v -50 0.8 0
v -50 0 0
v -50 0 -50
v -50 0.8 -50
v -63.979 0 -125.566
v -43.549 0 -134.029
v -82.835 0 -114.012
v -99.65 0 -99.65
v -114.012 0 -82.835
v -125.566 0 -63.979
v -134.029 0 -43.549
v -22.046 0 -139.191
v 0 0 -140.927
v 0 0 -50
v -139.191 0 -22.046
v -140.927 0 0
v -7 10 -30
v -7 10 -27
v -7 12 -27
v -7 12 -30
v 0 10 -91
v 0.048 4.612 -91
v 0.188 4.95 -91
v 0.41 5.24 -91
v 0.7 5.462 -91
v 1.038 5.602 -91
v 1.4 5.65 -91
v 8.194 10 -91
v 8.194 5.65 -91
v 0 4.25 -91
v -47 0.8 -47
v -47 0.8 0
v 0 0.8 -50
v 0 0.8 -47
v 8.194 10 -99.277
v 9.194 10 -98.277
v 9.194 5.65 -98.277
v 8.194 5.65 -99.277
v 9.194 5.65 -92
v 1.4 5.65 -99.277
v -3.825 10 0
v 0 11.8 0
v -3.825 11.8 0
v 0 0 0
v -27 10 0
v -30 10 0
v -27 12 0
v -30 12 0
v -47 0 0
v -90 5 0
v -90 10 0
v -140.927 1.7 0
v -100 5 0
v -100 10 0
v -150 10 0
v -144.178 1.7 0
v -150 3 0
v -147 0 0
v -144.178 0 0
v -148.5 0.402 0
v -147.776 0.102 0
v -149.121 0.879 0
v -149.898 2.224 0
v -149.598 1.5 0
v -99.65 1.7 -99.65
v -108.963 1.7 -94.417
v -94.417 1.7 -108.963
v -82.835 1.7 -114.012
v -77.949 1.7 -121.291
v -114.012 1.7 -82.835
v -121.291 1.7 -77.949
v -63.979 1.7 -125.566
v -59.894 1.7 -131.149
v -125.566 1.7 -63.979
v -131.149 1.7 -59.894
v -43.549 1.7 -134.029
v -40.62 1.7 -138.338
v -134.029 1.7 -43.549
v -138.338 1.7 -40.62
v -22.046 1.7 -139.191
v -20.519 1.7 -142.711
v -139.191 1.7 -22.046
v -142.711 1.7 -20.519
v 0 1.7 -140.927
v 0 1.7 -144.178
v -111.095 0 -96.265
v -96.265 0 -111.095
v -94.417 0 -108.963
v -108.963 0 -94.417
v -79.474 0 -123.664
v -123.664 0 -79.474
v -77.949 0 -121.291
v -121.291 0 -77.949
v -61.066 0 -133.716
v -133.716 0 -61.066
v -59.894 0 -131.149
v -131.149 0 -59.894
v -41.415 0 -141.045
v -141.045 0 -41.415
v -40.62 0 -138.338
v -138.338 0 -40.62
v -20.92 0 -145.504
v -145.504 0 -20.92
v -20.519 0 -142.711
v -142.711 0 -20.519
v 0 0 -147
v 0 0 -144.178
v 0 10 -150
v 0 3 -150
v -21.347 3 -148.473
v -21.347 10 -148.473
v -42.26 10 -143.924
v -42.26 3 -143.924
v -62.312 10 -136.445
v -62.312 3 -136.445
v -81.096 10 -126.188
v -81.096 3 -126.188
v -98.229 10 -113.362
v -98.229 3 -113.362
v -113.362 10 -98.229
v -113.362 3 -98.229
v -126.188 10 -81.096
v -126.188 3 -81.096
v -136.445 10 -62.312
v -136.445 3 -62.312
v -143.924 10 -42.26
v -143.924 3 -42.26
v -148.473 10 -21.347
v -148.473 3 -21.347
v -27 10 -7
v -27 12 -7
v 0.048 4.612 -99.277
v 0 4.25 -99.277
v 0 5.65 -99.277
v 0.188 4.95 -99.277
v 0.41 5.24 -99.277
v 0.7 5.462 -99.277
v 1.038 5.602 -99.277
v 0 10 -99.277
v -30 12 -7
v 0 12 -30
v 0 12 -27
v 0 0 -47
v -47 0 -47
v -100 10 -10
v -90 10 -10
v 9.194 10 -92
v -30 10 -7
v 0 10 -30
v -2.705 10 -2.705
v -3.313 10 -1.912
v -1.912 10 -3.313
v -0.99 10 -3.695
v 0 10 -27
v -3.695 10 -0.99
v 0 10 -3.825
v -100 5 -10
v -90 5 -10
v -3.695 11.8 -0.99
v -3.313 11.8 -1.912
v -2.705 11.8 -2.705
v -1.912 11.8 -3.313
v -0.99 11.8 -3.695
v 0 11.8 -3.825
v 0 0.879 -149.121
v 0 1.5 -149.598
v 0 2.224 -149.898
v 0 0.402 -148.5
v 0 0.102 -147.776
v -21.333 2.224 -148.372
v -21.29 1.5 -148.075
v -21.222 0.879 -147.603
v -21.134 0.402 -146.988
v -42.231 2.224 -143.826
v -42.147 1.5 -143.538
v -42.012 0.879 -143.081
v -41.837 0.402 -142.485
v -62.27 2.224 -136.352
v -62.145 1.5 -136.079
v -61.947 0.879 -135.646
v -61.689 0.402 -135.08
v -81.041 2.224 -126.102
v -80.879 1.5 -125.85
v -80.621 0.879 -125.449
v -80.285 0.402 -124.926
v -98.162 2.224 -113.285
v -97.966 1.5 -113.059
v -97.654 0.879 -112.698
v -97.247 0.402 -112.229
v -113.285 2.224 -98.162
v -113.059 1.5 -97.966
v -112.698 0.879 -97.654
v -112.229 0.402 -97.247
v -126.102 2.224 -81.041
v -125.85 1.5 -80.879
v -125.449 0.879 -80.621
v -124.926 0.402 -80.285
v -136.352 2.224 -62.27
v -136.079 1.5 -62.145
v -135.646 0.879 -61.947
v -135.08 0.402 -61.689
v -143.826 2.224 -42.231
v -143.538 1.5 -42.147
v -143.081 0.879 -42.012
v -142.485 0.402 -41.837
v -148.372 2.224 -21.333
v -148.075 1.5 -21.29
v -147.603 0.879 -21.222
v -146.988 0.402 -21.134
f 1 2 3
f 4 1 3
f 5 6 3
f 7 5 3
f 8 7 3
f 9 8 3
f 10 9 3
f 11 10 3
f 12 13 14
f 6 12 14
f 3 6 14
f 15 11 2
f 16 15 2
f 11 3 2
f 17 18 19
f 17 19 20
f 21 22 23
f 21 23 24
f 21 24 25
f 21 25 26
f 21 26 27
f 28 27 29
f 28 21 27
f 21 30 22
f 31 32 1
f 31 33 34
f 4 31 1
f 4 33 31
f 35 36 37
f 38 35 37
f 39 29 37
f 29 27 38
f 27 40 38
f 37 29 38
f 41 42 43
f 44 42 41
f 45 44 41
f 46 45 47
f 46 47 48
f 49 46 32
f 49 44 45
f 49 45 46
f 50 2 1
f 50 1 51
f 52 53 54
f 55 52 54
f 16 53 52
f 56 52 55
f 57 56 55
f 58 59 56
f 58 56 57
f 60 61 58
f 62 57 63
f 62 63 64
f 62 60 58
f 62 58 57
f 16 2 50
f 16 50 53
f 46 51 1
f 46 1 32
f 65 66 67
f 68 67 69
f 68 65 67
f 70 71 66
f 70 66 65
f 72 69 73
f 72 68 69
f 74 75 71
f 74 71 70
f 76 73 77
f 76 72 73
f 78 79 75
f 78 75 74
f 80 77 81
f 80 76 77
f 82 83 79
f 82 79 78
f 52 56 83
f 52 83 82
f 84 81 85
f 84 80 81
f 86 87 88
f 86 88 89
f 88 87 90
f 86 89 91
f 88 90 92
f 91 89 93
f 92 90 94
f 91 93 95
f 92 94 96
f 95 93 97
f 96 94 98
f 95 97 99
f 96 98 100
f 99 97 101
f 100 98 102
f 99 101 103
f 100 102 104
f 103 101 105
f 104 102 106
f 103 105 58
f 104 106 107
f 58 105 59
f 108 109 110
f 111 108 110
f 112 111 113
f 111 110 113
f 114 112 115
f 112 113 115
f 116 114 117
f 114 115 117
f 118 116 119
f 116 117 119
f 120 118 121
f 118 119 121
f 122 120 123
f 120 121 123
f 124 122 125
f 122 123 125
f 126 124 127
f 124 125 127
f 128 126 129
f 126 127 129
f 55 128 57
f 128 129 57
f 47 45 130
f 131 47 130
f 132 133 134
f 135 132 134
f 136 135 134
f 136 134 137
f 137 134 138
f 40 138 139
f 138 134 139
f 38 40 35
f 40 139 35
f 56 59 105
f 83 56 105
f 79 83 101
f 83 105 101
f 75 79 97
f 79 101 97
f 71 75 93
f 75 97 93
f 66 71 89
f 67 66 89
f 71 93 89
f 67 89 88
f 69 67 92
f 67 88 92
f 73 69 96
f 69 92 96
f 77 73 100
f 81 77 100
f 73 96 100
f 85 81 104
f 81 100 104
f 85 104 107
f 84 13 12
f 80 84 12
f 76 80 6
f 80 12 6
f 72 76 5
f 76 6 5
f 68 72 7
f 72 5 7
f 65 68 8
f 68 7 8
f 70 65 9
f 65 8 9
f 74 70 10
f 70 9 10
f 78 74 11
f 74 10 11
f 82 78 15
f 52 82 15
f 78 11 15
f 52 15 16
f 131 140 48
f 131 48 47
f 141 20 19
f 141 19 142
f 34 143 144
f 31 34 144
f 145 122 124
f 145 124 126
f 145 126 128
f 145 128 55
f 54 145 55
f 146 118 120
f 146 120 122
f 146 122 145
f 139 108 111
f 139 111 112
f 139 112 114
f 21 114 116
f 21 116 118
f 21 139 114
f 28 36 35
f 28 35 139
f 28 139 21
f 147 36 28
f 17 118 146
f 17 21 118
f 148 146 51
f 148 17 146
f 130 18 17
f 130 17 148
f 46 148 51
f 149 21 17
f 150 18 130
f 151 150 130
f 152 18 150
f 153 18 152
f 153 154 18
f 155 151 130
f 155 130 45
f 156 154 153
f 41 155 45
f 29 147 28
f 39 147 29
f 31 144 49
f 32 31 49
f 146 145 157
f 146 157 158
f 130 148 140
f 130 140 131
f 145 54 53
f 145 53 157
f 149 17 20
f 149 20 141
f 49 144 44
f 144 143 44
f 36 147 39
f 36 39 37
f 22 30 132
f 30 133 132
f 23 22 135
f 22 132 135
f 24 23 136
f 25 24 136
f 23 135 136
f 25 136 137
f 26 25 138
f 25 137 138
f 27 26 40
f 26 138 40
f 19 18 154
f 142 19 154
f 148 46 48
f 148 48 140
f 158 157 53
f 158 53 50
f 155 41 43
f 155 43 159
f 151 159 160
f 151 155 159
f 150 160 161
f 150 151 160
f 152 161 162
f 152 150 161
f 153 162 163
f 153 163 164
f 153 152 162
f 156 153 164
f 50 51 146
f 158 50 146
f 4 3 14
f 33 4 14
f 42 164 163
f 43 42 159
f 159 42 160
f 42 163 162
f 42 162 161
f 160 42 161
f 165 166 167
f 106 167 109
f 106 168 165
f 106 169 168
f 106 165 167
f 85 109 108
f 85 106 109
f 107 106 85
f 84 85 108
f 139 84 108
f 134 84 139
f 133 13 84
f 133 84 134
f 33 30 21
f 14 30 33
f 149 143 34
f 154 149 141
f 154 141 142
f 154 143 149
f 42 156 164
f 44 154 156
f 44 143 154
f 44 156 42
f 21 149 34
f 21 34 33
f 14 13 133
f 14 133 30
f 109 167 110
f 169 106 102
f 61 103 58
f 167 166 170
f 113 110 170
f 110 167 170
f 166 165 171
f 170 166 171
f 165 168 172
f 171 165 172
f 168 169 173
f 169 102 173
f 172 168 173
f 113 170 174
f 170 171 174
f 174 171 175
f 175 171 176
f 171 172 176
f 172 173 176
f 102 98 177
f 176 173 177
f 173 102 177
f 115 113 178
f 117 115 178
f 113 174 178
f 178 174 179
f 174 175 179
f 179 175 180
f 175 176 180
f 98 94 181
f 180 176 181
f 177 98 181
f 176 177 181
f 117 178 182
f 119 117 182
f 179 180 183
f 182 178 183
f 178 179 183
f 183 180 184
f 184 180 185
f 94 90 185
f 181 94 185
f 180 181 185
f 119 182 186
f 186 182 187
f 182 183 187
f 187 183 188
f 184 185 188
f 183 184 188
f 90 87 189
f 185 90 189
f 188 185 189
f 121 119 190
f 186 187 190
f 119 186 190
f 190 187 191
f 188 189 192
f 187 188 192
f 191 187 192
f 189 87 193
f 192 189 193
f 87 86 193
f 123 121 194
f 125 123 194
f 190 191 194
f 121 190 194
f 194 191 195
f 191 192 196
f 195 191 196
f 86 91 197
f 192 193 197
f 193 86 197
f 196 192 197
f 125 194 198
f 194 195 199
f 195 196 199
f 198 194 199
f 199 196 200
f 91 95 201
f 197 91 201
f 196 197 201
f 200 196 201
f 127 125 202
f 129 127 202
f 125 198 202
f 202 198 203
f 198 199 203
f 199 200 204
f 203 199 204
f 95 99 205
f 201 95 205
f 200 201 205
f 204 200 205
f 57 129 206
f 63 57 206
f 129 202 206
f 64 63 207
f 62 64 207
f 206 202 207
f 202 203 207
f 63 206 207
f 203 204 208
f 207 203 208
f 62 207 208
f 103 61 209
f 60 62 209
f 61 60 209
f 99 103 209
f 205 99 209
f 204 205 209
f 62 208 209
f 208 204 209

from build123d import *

# Parameters (mm, degrees)
SKETCH1_R           = 150
BOSS_EXTRUDE3_DEPTH = 10
CUT_EXTRUDE2_DEPTH  = 10
BOSS_EXTRUDE4_DEPTH = 1.8
SKETCH6_W           = 3
SKETCH6_H           = 7
BOSS_EXTRUDE5_DEPTH = 2
SKETCH7_W           = 7
SKETCH7_H           = 3
BOSS_EXTRUDE6_DEPTH = 2
SKETCH8_W           = 10
SKETCH8_H           = 10
CUT_EXTRUDE3_DEPTH  = 5
SKETCH9_W           = 9.193751657
SKETCH9_H           = 8.277315045
BOSS_EXTRUDE7_DEPTH = 4.35
CHAMFER1_SIZE       = 1
CUT_EXTRUDE4_DEPTH  = 1.7
CUT_EXTRUDE5_DEPTH  = 0.8
FILLET1_R           = 3
FILLET2_R           = 1.4


with BuildPart() as part:
    # Sketch1 → Boss-Extrude3 (new body)
    with BuildSketch(Plane(origin=(0, 0, 0), x_dir=(1, 0, 0), z_dir=(0, 1, 0))):
        with Locations(Location((0, 0, 0), (0, 0, 270))):
            Circle(SKETCH1_R)
    extrude(amount=BOSS_EXTRUDE3_DEPTH)

    # Sketch4 → Cut-Extrude2 (cut)
    with BuildSketch(Plane(origin=(0, 10, 0), x_dir=(1, 0, 0), z_dir=(0, 1, 0))):
        Polygon((0, 0), (0, 162.329653064), (183.678217859, 162.329653064), (183.678217859, -176.427761891), (-217.916482153, -176.427761891), (-217.916482153, 0), align=None)
    extrude(amount=-CUT_EXTRUDE2_DEPTH, mode=Mode.SUBTRACT)

    # Sketch5 → Boss-Extrude4 (add)
    with BuildSketch(Plane(origin=(0, 10, 0), x_dir=(1, 0, 0), z_dir=(0, 1, 0))):
        with BuildLine():
            Line((0, 3.825), (0, 0))
            Line((0, 0), (-3.825, 0))
            ThreePointArc((-3.825, 0), (-2.704683438, 2.704683438), (0, 3.825))
        make_face()
    extrude(amount=BOSS_EXTRUDE4_DEPTH)

    # Sketch6 → Boss-Extrude5 (add)
    with BuildSketch(Plane(origin=(0, 10, 0), x_dir=(1, 0, 0), z_dir=(0, 1, 0))):
        with Locations((-28.5, 3.5)):
            Rectangle(SKETCH6_W, SKETCH6_H)
    extrude(amount=BOSS_EXTRUDE5_DEPTH)

    # Sketch7 → Boss-Extrude6 (add)
    with BuildSketch(Plane(origin=(0, 10, 0), x_dir=(1, 0, 0), z_dir=(0, 1, 0))):
        with Locations((-3.5, 28.5)):
            Rectangle(SKETCH7_W, SKETCH7_H)
    extrude(amount=BOSS_EXTRUDE6_DEPTH)

    # Sketch8 → Cut-Extrude3 (cut)
    with BuildSketch(Plane(origin=(0, 10, 0), x_dir=(1, 0, 0), z_dir=(0, 1, 0))):
        with Locations((-95, 5)):
            Rectangle(SKETCH8_W, SKETCH8_H)
    extrude(amount=-CUT_EXTRUDE3_DEPTH, mode=Mode.SUBTRACT)

    # Sketch9 → Boss-Extrude7 (add)
    with BuildSketch(Plane(origin=(0, 10, 0), x_dir=(1, 0, 0), z_dir=(0, 1, 0))):
        with Locations((4.596875828, 95.138657523)):
            Rectangle(SKETCH9_W, SKETCH9_H)
    extrude(amount=-BOSS_EXTRUDE7_DEPTH)

    # Chamfer1
    chamfer1_edges = [part.edges().sort_by_distance(p)[0] for p in [
        (9.193751657, 7.825, -99.277315045),
        (9.193751657, 7.825, -91),
    ]]
    chamfer(chamfer1_edges, length=CHAMFER1_SIZE)

    # Sketch10 → Cut-Extrude4 (cut)
    with BuildSketch(Plane.XZ):
        with BuildLine():
            Line((-140.926536809, 0), (-144.178447036, 0))
            ThreePointArc((-144.178447036, 0), (-101.9495576, -101.9495576), (0, -144.178447036))
            Line((0, -144.178447036), (0, -140.926536809))
            ThreePointArc((0, -140.926536809), (-99.650109827, -99.650109827), (-140.926536809, 0))
        make_face()
    extrude(amount=-CUT_EXTRUDE4_DEPTH, mode=Mode.SUBTRACT)

    # Sketch11 → Cut-Extrude5 (cut)
    with BuildSketch(Plane(origin=(0, 0, 0), x_dir=(-1, 0, 0), z_dir=(0, -1, 0))):
        Polygon((47, 0), (50, 0), (50, 50), (0, 50), (0, 47), (47, 47), align=None)
    extrude(amount=-CUT_EXTRUDE5_DEPTH, mode=Mode.SUBTRACT)

    # Fillet1
    fillet1_edges = [part.edges().sort_by_distance(p)[0] for p in [
        (-106.066017178, 0, -106.066017178),
    ]]
    fillet(fillet1_edges, radius=FILLET1_R)

    # Fillet2
    fillet2_edges = [part.edges().sort_by_distance(p)[0] for p in [
        (0, 5.65, -95.138657523),
    ]]
    fillet(fillet2_edges, radius=FILLET2_R)


solid = part.part
